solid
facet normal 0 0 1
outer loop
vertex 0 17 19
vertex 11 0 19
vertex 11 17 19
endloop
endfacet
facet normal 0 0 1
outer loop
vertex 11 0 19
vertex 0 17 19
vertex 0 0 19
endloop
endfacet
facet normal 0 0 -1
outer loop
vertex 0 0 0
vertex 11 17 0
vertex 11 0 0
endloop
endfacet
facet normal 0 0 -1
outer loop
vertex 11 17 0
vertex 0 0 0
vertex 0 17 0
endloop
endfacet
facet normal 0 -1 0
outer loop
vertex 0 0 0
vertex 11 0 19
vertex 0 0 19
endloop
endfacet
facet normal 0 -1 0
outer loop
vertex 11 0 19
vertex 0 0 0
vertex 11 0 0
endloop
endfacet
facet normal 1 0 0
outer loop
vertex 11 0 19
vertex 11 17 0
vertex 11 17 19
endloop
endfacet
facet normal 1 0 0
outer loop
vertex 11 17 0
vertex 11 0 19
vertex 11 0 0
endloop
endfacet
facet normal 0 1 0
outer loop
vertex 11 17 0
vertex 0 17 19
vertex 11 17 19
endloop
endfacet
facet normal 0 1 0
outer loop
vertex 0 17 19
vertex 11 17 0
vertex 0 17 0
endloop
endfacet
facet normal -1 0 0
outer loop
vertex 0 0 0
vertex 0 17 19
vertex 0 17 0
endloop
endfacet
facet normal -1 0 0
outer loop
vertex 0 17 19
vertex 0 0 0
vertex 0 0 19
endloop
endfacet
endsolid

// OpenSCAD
// Generated by SolidPython 1.0.1 on 2020-07-29 00:46:55


cube(size = [11, 17, 19]);
/***********************************************
*********      SolidPython code:      **********
************************************************
 
# import packages: SolidPython
from solid import *
from solid.utils import *
from itertools import chain, combinations, permutations


class Resize:

    def __init__(self, scad_file):
        self.scad_file = scad_file
        #self.scad_file = import_scad(scad_file)
        # cone/cylinder param:
        self.r1 = 0
        self.r2 = 0
        self.h = 0
        # rectangular prism param:
        self.w = 0
        self.l = 0
        # ellipse param:
        self.r = 0

    # import OpenScad code (file name corresponds to shape)


    # classify shape + parameters
    def assign(self, param1, param2, param3):
        if self.scad_file == 'cone.scad':
            self.r1 = param1
            self.r2 = param2
            self.h = param3
        elif self.scad_file == 'cylinder.scad':
            self.r1 = param1
            self.r2 = param2
            self.h = param3
        elif self.scad_file == 'rectangularPrism.scad':
            self.h = param1
            self.l = param2
            self.w = param3
        else:
            self.r = param1
            self.h = param2

    # resize parameters
    def iterate(self):
        x = range(3, 20, 2)
        i = 1
        if self.scad_file == 'cone.scad':
            tempList = list(permutations(x, 2))
            for temp in tempList:
                param1 = temp[0]
                param2 = temp[1]
                filepath = 'produced_scad_files/' + 'cone' + str(param1) + '_' + str(param2) + '_' + '.scad'
                scad_render_to_file(cylinder(h=param1, r1=param2, r2=0), filepath)

        elif self.scad_file == 'cylinder.scad':
            tempList = list(permutations(x, 3))
            for temp in tempList:
                param1 = temp[0]
                param2 = temp[1]
                filepath = 'produced_scad_files/' + 'cylinder' + str(param1) + '_' + str(param2) + '_' + '.scad'
                scad_render_to_file(cylinder(h=param1, r1=param2, r2=param2), filepath)

        elif self.scad_file == 'rectangularPrism.scad':
            tempList = list(permutations(x, 3))
            for temp in tempList:
                param1 = temp[0]
                param2 = temp[1]
                param3 = temp[2]
                filepath = 'produced_scad_files/' + 'rectangularPrism' + str(param1) + '_' + str(param2) + '_' + str(
                    param3) + '.scad'
                scad_render_to_file(cube(size=(param1, param2, param3)), filepath)

        elif self.scad_file == 'ellipse.scad':
            tempList = list(permutations(x, 4))
            for temp in tempList:
                param1 = temp[0]
                param2 = temp[1]
                param3 = temp[2]
                param4 = temp[3]
                filepath = 'produced_scad_files/' + 'ellipse' + str(param1) + '_' + str(param2) + '_' + str(param3) + '_' + str(param4) + '.scad'
                scad_render_to_file(scale([param1, param2, param3])(sphere(r=param4)), filepath)

    def render_to_scadfile(self):
        scad_render_to_file(scad, 'example.scad') 
 
************************************************/
